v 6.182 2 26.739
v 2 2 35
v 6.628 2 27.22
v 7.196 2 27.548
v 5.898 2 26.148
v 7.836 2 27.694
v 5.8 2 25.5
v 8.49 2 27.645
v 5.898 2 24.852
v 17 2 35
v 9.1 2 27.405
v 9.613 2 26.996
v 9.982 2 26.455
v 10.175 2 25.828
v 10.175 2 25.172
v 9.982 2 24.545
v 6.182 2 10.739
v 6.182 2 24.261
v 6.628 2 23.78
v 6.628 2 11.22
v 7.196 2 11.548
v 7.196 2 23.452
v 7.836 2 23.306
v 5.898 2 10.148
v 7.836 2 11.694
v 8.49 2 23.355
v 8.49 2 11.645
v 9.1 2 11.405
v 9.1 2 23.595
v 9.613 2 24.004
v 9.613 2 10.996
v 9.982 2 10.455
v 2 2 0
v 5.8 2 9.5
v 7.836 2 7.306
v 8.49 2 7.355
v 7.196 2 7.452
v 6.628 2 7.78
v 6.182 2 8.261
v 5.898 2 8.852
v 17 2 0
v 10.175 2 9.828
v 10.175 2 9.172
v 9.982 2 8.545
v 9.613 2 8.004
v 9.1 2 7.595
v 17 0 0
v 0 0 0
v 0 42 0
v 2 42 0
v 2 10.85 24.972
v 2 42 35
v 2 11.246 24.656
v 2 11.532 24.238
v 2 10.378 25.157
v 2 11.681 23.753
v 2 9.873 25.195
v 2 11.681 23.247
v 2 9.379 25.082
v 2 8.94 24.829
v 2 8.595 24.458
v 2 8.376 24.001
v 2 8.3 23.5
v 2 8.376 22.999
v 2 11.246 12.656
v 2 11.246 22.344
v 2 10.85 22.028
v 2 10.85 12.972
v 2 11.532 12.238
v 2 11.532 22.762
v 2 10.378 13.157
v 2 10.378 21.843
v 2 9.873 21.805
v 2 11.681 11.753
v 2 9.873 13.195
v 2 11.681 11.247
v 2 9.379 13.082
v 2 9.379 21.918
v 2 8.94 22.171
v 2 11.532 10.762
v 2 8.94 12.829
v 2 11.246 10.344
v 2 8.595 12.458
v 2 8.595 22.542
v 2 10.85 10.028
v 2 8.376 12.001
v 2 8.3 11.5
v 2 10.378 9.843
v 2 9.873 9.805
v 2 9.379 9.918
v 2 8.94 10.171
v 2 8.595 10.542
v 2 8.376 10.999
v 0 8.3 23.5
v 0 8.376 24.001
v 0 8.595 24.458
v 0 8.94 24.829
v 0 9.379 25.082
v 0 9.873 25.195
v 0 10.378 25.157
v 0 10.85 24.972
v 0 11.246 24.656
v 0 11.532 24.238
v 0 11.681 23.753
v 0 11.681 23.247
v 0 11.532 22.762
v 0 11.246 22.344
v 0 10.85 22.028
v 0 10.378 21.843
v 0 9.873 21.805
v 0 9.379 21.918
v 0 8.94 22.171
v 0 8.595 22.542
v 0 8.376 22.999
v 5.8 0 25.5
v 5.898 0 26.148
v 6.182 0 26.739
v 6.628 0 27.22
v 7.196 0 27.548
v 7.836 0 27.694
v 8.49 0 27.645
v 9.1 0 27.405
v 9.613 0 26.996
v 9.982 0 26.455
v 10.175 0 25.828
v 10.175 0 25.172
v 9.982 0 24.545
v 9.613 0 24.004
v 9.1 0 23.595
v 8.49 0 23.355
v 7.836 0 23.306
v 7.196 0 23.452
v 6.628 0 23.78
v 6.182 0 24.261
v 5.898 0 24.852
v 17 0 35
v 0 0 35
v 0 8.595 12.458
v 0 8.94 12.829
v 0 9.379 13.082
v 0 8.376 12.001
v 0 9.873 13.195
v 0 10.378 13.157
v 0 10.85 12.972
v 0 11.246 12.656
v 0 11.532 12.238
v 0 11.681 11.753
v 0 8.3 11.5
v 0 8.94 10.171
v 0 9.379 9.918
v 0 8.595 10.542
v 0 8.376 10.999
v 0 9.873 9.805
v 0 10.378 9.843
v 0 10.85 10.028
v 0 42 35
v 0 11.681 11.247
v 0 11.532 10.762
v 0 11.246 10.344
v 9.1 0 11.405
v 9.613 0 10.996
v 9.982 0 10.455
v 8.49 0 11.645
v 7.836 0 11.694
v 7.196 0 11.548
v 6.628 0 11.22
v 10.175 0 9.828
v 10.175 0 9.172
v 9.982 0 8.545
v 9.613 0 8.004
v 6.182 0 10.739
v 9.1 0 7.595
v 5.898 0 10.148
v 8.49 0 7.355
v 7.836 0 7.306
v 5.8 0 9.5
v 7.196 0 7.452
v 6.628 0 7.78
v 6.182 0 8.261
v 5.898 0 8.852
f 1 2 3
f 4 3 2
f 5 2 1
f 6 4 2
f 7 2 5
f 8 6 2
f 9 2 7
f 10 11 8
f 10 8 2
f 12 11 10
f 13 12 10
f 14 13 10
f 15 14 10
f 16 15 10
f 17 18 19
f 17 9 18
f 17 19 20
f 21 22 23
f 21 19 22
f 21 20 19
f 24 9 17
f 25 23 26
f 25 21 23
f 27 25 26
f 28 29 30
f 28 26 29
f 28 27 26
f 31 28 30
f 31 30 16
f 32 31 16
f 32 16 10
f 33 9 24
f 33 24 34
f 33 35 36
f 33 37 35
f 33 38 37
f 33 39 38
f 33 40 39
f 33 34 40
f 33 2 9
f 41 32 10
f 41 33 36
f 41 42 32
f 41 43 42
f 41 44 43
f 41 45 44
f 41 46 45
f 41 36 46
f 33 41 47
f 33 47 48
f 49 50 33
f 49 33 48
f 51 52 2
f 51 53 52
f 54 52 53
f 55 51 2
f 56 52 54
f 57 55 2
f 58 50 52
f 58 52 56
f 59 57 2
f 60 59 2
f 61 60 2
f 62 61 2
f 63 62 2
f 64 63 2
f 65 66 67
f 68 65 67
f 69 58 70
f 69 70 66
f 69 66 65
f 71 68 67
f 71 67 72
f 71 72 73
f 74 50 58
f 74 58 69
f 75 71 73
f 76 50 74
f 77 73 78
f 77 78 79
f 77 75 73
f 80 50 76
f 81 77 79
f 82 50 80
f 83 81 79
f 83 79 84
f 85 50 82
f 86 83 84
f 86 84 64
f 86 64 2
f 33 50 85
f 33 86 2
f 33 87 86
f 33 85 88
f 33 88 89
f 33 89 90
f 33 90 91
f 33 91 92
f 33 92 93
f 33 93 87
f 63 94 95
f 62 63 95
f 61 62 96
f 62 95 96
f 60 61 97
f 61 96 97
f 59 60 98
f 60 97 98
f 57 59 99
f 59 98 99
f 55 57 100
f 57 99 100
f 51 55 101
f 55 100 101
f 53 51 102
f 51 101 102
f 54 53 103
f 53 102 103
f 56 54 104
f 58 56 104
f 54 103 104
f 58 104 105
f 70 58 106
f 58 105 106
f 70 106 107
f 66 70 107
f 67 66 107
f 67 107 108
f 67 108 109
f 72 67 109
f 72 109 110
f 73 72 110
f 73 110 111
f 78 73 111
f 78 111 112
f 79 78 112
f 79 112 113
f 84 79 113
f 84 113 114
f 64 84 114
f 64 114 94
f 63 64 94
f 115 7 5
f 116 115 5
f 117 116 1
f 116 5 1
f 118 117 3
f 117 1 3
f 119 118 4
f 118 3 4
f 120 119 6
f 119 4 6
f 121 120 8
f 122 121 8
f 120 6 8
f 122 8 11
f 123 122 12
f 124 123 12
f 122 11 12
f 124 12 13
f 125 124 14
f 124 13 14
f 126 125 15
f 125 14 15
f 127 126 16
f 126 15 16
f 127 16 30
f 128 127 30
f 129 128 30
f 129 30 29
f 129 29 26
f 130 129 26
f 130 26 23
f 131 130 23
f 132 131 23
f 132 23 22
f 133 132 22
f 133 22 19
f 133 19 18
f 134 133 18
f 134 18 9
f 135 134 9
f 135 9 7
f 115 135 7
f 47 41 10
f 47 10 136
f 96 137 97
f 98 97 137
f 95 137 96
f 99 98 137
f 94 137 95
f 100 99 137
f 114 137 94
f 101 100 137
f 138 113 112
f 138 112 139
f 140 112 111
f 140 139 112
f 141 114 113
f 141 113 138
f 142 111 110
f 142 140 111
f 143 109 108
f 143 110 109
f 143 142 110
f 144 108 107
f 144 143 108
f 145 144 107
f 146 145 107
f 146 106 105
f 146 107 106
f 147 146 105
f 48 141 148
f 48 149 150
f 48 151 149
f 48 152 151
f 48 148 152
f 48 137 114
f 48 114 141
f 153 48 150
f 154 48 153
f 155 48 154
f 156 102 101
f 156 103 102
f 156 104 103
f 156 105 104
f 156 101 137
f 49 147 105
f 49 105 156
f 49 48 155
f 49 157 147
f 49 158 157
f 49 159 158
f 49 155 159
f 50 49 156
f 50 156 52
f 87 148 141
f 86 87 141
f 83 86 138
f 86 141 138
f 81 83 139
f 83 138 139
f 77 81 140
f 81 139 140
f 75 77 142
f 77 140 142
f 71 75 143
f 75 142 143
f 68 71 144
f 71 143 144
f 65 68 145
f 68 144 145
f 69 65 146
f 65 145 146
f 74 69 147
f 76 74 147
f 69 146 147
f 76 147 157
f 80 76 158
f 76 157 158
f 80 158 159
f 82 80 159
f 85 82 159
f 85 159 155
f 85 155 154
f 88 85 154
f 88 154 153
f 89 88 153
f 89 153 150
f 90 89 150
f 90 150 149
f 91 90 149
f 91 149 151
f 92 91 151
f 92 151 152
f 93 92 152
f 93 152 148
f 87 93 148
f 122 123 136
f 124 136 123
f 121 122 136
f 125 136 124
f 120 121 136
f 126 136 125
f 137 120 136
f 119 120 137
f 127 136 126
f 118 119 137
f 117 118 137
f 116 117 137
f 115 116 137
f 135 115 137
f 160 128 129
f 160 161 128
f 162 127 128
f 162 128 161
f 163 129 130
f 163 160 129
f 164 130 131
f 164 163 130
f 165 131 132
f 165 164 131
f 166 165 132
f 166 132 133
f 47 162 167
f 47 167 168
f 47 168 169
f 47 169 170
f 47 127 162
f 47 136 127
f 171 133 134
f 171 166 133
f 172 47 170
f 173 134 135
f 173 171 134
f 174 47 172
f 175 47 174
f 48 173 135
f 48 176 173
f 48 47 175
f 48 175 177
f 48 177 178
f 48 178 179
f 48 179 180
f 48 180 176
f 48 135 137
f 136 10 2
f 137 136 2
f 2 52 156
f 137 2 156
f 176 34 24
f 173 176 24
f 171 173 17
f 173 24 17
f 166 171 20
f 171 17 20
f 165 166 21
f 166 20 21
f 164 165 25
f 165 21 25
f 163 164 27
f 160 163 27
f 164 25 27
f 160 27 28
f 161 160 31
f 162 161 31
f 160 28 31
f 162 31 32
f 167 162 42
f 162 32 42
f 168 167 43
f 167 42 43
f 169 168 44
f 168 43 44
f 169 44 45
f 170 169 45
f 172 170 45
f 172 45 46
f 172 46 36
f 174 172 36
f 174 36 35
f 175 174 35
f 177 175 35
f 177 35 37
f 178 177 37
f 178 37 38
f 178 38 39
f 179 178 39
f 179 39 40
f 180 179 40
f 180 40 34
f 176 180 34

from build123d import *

# Parameters (mm, degrees)
EXTRUDE_1_DEPTH     = 35
CUT_EXTRUDE_1_REACH = 57.803
SKETCH_2_R          = 2.2
SKETCH_3_R          = 1.7
CUT_EXTRUDE_2_DEPTH = 58.253820833


with BuildPart() as part:
    # 草图1 → 凸台-拉伸1 (new body)
    with BuildSketch(Plane.XY):
        Polygon((0, 0), (0, 42), (2, 42), (2, 2), (17, 2), (17, 0), align=None)
    extrude(amount=EXTRUDE_1_DEPTH)

    # 草图2 → 切除-拉伸1 (cut, up to next)
    with BuildSketch(Plane(origin=(0, 2, 0), x_dir=(1, 0, 0), z_dir=(0, 1, 0)), mode=Mode.PRIVATE) as cut_extrude_1_sk1:
        with Locations(Location((8, -9.5, 0), (0, 0, 180))):
            Circle(SKETCH_2_R)
    cut_extrude_1_tool1 = extrude(cut_extrude_1_sk1.sketch, amount=-CUT_EXTRUDE_1_REACH, mode=Mode.PRIVATE) & part.part
    # 草图2 → 切除-拉伸1 (cut, up to next)
    with BuildSketch(Plane(origin=(0, 2, 0), x_dir=(1, 0, 0), z_dir=(0, 1, 0)), mode=Mode.PRIVATE) as cut_extrude_1_sk2:
        with Locations(Location((8, -25.5, 0), (0, 0, 180))):
            Circle(SKETCH_2_R)
    cut_extrude_1_tool2 = extrude(cut_extrude_1_sk2.sketch, amount=-CUT_EXTRUDE_1_REACH, mode=Mode.PRIVATE) & part.part
    add(cut_extrude_1_tool1.solids().sort_by_distance((8, 2, 9.5))[0], mode=Mode.SUBTRACT)
    add(cut_extrude_1_tool2.solids().sort_by_distance((8, 2, 25.5))[0], mode=Mode.SUBTRACT)

    # 草图3 → 切除-拉伸2 (cut, through all)
    with BuildSketch(Plane.ZY):
        with Locations(Location((11.5, 10, 0), (0, 0, 270))):
            Circle(SKETCH_3_R)
        with Locations(Location((23.5, 10, 0), (0, 0, 270))):
            Circle(SKETCH_3_R)
    extrude(amount=-CUT_EXTRUDE_2_DEPTH, mode=Mode.SUBTRACT)


solid = part.part
